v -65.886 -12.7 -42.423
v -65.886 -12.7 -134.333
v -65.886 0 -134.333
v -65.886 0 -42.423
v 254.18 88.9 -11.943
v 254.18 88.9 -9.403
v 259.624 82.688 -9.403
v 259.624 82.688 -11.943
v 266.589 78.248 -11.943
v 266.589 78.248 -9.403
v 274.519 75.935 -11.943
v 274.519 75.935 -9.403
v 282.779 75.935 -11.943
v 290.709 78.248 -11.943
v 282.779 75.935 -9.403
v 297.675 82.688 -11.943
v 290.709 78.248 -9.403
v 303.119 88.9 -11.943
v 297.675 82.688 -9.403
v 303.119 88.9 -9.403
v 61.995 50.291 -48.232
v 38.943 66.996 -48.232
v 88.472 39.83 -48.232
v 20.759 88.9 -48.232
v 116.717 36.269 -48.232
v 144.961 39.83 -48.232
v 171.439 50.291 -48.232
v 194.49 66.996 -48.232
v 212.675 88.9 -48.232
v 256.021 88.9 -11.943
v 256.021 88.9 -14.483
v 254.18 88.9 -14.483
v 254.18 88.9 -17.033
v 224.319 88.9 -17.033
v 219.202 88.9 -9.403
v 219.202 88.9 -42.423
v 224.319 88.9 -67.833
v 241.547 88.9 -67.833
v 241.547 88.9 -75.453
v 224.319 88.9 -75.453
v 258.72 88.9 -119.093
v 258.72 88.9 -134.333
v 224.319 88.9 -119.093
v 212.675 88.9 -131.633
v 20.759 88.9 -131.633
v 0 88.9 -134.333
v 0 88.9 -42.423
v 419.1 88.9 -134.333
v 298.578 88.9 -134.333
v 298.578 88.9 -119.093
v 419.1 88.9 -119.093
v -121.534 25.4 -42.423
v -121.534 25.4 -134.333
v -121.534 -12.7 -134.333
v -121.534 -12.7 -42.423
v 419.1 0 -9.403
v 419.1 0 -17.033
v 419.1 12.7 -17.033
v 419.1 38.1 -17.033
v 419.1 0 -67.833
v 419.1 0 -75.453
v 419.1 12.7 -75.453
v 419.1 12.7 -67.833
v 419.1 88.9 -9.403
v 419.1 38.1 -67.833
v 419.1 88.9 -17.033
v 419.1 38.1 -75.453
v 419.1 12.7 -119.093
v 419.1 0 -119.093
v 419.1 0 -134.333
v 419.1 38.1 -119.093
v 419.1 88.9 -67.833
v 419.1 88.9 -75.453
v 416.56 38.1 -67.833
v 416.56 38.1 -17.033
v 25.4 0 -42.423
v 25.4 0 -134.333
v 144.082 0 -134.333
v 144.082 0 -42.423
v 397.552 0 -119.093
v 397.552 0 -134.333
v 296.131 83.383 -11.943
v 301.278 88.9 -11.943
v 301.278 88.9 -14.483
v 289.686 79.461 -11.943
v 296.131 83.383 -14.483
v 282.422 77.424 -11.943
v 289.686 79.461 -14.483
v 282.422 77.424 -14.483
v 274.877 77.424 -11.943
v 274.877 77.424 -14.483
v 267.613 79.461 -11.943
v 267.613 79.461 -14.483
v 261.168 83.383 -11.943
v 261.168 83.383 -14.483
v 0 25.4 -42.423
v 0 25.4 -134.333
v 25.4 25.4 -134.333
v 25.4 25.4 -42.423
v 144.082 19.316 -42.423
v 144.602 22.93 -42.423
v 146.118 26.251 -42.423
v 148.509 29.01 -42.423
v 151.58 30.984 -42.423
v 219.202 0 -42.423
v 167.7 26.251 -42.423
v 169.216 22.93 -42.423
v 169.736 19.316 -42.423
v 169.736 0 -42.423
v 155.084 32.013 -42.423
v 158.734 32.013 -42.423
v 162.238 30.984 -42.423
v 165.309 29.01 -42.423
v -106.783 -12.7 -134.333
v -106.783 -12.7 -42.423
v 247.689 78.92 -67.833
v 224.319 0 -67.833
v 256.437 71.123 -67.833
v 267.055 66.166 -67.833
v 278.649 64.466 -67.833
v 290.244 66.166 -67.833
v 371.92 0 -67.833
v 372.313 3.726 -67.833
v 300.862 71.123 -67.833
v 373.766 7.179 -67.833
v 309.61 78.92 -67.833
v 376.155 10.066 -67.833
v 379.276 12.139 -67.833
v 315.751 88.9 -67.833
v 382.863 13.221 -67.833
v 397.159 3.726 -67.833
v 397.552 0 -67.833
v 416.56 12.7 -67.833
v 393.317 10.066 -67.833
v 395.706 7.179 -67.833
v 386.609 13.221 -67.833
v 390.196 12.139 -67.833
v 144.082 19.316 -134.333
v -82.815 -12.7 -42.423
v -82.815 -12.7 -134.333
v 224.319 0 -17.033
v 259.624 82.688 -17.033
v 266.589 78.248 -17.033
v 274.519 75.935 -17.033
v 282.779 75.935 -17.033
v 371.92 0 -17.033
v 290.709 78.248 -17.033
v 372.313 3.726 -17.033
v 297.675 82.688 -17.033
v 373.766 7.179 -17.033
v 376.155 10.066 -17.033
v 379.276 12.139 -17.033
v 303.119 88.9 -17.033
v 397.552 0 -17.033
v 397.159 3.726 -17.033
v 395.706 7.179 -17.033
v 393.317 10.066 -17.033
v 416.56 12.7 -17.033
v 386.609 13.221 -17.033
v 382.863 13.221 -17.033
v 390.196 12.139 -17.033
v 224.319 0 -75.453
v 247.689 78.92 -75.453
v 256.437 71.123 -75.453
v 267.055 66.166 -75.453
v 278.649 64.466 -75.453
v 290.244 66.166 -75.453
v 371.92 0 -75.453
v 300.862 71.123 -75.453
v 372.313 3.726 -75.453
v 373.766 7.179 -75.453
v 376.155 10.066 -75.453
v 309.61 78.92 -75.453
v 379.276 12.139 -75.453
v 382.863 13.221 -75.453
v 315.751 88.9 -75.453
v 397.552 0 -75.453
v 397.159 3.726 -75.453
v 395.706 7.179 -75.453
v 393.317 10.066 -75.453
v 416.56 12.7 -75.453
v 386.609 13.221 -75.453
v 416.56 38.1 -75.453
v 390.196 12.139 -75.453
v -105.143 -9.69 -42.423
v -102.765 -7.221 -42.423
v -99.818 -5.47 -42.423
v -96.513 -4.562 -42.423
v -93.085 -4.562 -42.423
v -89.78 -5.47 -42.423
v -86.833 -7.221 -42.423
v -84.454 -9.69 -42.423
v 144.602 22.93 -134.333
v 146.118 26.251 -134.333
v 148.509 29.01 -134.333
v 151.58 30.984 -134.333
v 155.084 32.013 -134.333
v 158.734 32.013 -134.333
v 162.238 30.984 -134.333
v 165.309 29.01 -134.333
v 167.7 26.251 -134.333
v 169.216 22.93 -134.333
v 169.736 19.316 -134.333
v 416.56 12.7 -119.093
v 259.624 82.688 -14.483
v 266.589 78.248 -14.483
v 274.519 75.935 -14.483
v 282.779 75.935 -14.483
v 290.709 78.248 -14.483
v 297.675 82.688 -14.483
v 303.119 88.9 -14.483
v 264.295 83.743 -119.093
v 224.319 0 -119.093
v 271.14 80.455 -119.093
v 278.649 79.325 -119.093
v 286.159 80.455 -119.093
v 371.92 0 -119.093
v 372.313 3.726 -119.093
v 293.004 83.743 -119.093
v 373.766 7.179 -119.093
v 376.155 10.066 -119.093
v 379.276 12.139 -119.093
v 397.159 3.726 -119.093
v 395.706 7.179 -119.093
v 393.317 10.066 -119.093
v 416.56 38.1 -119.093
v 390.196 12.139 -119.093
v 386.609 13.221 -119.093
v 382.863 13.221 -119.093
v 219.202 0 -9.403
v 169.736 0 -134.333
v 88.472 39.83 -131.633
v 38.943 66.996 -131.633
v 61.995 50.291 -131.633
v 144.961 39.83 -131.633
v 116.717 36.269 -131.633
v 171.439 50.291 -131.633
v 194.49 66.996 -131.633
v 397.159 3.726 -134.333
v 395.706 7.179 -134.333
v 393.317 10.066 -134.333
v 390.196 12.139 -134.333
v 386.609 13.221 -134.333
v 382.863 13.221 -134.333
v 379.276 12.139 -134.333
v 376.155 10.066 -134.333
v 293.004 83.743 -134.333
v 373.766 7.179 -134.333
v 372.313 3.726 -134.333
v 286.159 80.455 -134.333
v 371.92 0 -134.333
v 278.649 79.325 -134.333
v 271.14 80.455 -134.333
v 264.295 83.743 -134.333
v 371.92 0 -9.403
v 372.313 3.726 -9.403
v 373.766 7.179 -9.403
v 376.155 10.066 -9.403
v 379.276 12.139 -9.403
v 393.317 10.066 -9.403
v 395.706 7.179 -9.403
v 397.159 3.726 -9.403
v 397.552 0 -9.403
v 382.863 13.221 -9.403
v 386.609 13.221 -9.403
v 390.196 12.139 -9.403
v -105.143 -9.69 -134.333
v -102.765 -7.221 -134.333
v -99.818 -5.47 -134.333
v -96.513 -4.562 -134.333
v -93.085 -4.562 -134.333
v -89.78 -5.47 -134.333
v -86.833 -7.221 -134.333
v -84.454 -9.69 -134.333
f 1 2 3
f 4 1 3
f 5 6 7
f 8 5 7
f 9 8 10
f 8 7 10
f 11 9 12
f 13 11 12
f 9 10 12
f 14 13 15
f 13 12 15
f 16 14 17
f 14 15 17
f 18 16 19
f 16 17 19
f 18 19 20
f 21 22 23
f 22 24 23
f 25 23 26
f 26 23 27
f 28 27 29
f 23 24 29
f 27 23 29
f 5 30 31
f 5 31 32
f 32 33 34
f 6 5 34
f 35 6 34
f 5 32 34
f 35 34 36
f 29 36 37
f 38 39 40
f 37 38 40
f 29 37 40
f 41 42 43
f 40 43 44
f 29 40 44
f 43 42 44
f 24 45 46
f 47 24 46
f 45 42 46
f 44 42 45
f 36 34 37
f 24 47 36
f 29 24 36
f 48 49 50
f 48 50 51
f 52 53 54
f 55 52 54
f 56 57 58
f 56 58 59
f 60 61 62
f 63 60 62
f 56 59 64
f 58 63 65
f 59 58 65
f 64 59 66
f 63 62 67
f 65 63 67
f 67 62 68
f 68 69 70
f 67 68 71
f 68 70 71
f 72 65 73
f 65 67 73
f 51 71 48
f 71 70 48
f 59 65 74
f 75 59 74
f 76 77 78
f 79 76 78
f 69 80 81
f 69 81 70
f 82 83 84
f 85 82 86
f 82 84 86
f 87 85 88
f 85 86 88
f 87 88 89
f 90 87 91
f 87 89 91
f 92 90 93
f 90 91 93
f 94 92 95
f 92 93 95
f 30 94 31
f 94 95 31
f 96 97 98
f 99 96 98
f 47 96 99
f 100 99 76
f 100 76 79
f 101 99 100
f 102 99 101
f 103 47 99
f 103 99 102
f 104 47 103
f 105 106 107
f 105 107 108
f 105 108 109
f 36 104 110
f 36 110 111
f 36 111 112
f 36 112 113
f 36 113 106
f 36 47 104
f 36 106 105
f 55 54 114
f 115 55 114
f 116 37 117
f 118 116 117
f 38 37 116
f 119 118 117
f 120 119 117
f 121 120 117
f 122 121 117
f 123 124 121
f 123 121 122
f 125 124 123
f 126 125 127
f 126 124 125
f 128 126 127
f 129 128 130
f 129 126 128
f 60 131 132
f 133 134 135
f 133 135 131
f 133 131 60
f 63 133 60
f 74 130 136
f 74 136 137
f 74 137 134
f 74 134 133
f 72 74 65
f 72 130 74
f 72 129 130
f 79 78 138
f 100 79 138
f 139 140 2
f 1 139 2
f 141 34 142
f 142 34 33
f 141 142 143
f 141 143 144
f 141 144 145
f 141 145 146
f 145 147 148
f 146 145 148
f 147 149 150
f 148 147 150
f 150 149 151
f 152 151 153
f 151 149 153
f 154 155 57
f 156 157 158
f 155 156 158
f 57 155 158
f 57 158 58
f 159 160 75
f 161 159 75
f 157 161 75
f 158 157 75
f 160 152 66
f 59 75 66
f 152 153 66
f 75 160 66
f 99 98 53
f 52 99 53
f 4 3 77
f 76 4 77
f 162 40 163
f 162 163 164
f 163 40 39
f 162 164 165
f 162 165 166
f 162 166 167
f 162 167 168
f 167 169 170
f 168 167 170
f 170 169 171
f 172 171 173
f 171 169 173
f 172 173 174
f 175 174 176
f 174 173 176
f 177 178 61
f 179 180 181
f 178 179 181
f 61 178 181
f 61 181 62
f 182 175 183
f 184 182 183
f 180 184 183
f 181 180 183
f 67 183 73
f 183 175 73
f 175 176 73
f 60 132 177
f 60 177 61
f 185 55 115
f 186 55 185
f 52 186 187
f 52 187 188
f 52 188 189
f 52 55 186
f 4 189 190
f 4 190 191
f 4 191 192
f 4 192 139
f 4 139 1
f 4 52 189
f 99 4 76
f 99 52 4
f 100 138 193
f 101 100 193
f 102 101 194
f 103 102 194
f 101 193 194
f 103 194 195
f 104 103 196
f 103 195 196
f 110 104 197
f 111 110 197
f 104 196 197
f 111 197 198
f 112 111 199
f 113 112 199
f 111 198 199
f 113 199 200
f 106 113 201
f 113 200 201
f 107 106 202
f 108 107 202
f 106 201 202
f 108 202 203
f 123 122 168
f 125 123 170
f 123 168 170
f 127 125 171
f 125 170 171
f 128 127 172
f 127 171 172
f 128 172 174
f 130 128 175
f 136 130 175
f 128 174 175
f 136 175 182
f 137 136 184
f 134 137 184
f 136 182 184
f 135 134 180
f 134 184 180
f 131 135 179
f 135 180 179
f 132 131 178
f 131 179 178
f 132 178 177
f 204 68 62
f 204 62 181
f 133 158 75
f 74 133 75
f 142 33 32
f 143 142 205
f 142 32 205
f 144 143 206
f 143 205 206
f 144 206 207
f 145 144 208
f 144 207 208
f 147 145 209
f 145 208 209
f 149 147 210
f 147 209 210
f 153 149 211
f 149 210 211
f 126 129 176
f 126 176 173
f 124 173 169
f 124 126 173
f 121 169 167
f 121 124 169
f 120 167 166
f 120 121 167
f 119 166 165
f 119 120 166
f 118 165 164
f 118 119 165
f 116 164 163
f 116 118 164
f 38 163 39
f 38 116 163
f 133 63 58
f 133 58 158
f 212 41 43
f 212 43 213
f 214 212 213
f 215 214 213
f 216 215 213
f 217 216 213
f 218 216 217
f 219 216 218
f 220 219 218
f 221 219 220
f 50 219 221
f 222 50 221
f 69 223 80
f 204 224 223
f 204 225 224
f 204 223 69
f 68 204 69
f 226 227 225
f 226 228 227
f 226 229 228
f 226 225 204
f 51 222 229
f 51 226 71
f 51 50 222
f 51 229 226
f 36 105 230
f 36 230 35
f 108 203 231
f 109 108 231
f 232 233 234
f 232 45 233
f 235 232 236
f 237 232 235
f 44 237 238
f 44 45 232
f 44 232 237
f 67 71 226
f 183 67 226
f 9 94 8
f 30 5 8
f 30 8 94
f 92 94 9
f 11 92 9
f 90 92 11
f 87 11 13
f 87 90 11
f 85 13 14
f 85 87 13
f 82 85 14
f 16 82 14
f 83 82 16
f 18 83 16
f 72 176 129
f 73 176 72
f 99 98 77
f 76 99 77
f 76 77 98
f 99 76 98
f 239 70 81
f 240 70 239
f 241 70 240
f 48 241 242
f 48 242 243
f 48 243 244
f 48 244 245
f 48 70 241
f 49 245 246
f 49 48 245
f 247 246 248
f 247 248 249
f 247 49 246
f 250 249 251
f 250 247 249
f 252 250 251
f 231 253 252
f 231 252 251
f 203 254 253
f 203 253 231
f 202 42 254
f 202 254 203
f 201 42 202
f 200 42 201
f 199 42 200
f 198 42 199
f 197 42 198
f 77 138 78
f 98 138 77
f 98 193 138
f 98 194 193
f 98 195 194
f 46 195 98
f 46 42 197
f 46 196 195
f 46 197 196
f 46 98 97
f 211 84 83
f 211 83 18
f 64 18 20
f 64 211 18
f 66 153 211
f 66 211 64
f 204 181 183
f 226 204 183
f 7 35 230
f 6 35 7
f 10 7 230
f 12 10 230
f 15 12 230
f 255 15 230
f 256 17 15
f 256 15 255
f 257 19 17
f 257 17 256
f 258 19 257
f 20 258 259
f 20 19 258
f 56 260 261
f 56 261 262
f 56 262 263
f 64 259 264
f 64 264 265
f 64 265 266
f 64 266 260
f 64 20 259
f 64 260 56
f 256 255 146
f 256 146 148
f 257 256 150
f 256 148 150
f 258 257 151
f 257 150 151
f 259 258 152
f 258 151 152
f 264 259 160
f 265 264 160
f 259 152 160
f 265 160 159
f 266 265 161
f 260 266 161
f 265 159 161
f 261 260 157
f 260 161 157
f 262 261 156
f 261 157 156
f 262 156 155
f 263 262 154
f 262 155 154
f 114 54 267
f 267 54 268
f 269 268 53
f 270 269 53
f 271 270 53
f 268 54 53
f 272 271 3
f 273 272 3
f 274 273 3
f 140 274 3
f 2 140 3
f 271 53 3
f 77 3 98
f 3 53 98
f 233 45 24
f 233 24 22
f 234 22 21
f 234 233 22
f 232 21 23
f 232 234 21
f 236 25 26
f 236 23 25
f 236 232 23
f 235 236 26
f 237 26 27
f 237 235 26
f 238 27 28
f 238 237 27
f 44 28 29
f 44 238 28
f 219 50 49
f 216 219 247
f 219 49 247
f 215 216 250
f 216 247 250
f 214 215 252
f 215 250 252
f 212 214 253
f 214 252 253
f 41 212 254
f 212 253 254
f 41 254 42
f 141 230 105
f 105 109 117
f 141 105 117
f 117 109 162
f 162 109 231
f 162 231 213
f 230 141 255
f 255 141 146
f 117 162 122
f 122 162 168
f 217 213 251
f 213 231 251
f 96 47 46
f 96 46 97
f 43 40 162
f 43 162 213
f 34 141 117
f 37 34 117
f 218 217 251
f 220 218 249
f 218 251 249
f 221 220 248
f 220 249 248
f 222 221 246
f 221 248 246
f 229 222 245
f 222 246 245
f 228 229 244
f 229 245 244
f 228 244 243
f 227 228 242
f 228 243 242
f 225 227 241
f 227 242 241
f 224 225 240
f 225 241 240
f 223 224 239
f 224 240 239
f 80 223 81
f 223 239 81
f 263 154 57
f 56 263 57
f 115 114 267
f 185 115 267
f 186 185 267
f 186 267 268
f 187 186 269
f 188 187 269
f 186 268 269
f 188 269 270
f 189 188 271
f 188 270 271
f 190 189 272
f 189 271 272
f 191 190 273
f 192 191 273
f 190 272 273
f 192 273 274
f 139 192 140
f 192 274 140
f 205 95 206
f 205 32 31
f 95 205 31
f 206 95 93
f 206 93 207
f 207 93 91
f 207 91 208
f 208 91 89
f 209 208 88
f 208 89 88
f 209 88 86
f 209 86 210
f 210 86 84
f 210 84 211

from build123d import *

# Parameters (mm, degrees)
SKETCH1_W           = 419.1
SKETCH1_H           = 142.18412
BOSS_EXTRUDE1_DEPTH = 88.9
SKETCH2_R           = 119.38
CUT_EXTRUDE1_DEPTH  = 83.4009
SKETCH7_W           = 194.780719179
SKETCH7_H           = 43.63974
SKETCH7_H_2         = 50.8
CUT_EXTRUDE2_DEPTH  = 452.402640644
SKETCH4_R           = 40.386
CUT_EXTRUDE4_DEPTH  = 10
SKETCH18_R          = 25.527
CUT_EXTRUDE11_DEPTH = 23.09114
SKETCH5_R           = 27.686
CUT_EXTRUDE5_DEPTH  = 448.05209497
SKETCH8_W           = 419.1
SKETCH8_H           = 88.9
CUT_EXTRUDE6_DEPTH  = 7.85114
SKETCH9_W           = 419.1
SKETCH9_H           = 88.9
CUT_EXTRUDE7_DEPTH  = 11.94308
SKETCH10_W          = 219.202
SKETCH10_H          = 88.9
CUT_EXTRUDE8_DEPTH  = 30.48
SKETCH12_W          = 121.533574186
SKETCH12_H          = 91.9099
BOSS_EXTRUDE2_DEPTH = 25.4
SKETCH14_W          = 55.647095764
SKETCH14_H          = 91.9099
BOSS_EXTRUDE3_DEPTH = 12.7
CUT_EXTRUDE10_REACH = 447.564
SKETCH17_R          = 12.827
SKETCH20_W          = 2.54
SKETCH20_H          = 25.4
BOSS_EXTRUDE4_DEPTH = 102.05974
SPLIT2_START        = -134.33298
SPLIT2_DEPTH        = 91.9099
SPLIT2_START_2      = -48.23206
SPLIT2_2_DEPTH      = 5.80898
SPLIT2_3_DEPTH      = 2.70002
SPLIT2_4_DEPTH      = 91.9099
SPLIT2_START_3      = -121.533574186
SPLIT2_5_DEPTH      = 340.735574186
SKETCH22_W          = 199.898
SKETCH22_H          = 88.9
BOSS_EXTRUDE5_DEPTH = 2.54
SKETCH24_R          = 29.21
CUT_EXTRUDE12_DEPTH = 2.54
CUT_EXTRUDE13_START = -5.08
SKETCH24_4_R        = 29.21
CUT_EXTRUDE13_DEPTH = 2.55016
SKETCH29_R          = 12.827
CUT_EXTRUDE14_DEPTH = 446.564033133
BOSS_EXTRUDE7_DEPTH = 91.9099


# Read off the part's stored shape, not the designer's step: Split2
with BuildPart() as part:
    # Sketch1 → Boss-Extrude1 (new body)
    with BuildSketch(Plane(origin=(0, 0, 0), x_dir=(1, 0, 0), z_dir=(0, 1, 0))):
        with Locations((209.55, 71.09206)):
            Rectangle(SKETCH1_W, SKETCH1_H)
    extrude(amount=BOSS_EXTRUDE1_DEPTH)

    # Sketch2 → Cut-Extrude1 (cut)
    with BuildSketch(Plane(origin=(0, 0, -131.63296), x_dir=(-1, 0, 0), z_dir=(0, 0, -1))):
        with Locations((-116.7166499, 150.061217688)):
            Circle(SKETCH2_R)
    extrude(amount=-CUT_EXTRUDE1_DEPTH, mode=Mode.SUBTRACT)

    # Sketch7 → Cut-Extrude2 (cut, through all)
    with BuildSketch(Plane(origin=(0, 88.9, 0), x_dir=(1, 0, 0), z_dir=(0, 1, 0))):
        with Locations((321.709640411, 97.27311)):
            Rectangle(SKETCH7_W, SKETCH7_H)
        with Locations((321.709640411, 42.43324)):
            Rectangle(SKETCH7_W, SKETCH7_H_2)
    extrude(amount=-CUT_EXTRUDE2_DEPTH, mode=Mode.SUBTRACT)

    # Sketch4 → Cut-Extrude4 (cut)
    with BuildSketch(Plane(origin=(0, 0, -67.83324), x_dir=(-1, 0, 0), z_dir=(0, 0, -1))):
        with Locations((-278.649352085, 104.852009966)):
            Circle(SKETCH4_R)
    extrude(amount=CUT_EXTRUDE4_DEPTH, mode=Mode.SUBTRACT)

    # Sketch18 → Cut-Extrude11 (cut)
    with BuildSketch(Plane(origin=(0, 0, -142.18412), x_dir=(-1, 0, 0), z_dir=(0, 0, -1))):
        with Locations((-278.649352085, 104.852009966)):
            Circle(SKETCH18_R)
    extrude(amount=-CUT_EXTRUDE11_DEPTH, mode=Mode.SUBTRACT)

    # Sketch5 → Cut-Extrude5 (cut, through all)
    with BuildSketch(Plane(origin=(0, 0, -14.48308), x_dir=(-1, 0, 0), z_dir=(0, 0, -1))):
        with Locations((-278.649352085, 104.852009966)):
            Circle(SKETCH5_R)
    extrude(amount=-CUT_EXTRUDE5_DEPTH, mode=Mode.SUBTRACT)

    # Sketch8 → Cut-Extrude6 (cut)
    with BuildSketch(Plane(origin=(0, 0, -142.18412), x_dir=(-1, 0, 0), z_dir=(0, 0, -1))):
        with Locations((-209.55, 44.45)):
            Rectangle(SKETCH8_W, SKETCH8_H)
    extrude(amount=-CUT_EXTRUDE6_DEPTH, mode=Mode.SUBTRACT)

    # Sketch9 → Cut-Extrude7 (cut)
    with BuildSketch(Plane.XY):
        with Locations((209.55, 44.45)):
            Rectangle(SKETCH9_W, SKETCH9_H)
    extrude(amount=-CUT_EXTRUDE7_DEPTH, mode=Mode.SUBTRACT)

    # Sketch10 → Cut-Extrude8 (cut)
    with BuildSketch(Plane.XY.offset(-11.94308)):
        with Locations((109.601, 44.45)):
            Rectangle(SKETCH10_W, SKETCH10_H)
    extrude(amount=-CUT_EXTRUDE8_DEPTH, mode=Mode.SUBTRACT)

    # Sketch12 → Boss-Extrude2 (add)
    with BuildSketch(Plane.XZ):
        with Locations((-60.766787093, -88.37803)):
            Rectangle(SKETCH12_W, SKETCH12_H)
    extrude(amount=-BOSS_EXTRUDE2_DEPTH)

    # Sketch14 → Boss-Extrude3 (add)
    with BuildSketch(Plane.XZ):
        with Locations((-93.710026304, -88.37803)):
            Rectangle(SKETCH14_W, SKETCH14_H)
    extrude(amount=BOSS_EXTRUDE3_DEPTH)

    # Cut-Extrude10: up to this face of the body (flat: up to its plane)
    cut_extrude10_end = Plane(part.part.faces().sort_by_distance((320.017892525, 43.601141034, -11.94308))[0])
    # Sketch17 → Cut-Extrude10 (cut, up to the picked face)
    with BuildSketch(Plane(origin=(0, 0, -134.33298), x_dir=(-1, 0, 0), z_dir=(0, 0, -1)), mode=Mode.PRIVATE) as cut_extrude10_sk1:
        with Locations((-384.735935495, 0.531880938)):
            Circle(SKETCH17_R)
    cut_extrude10_tool1 = split(extrude(cut_extrude10_sk1.sketch, amount=-CUT_EXTRUDE10_REACH, mode=Mode.PRIVATE), bisect_by=cut_extrude10_end, keep=Keep.BOTH, mode=Mode.PRIVATE)
    # Sketch17 → Cut-Extrude10 (cut, up to the picked face)
    with BuildSketch(Plane(origin=(0, 0, -134.33298), x_dir=(-1, 0, 0), z_dir=(0, 0, -1)), mode=Mode.PRIVATE) as cut_extrude10_sk2:
        with Locations((94.798916194, -17.274045482)):
            Circle(SKETCH17_R)
    cut_extrude10_tool2 = split(extrude(cut_extrude10_sk2.sketch, amount=-CUT_EXTRUDE10_REACH, mode=Mode.PRIVATE), bisect_by=cut_extrude10_end, keep=Keep.BOTH, mode=Mode.PRIVATE)
    # Sketch17 → Cut-Extrude10 (cut, up to the picked face)
    with BuildSketch(Plane(origin=(0, 0, -134.33298), x_dir=(-1, 0, 0), z_dir=(0, 0, -1)), mode=Mode.PRIVATE) as cut_extrude10_sk3:
        with BuildLine():
            Line((-169.736021607, 19.31637742), (-169.736021607, 0))
            Line((-169.736021607, 0), (-144.082021607, 0))
            Line((-144.082021607, 0), (-144.082021607, 19.31637742))
            ThreePointArc((-144.082021607, 19.31637742), (-156.909021607, 32.14337742), (-169.736021607, 19.31637742))
        make_face()
    cut_extrude10_tool3 = split(extrude(cut_extrude10_sk3.sketch, amount=-CUT_EXTRUDE10_REACH, mode=Mode.PRIVATE), bisect_by=cut_extrude10_end, keep=Keep.BOTH, mode=Mode.PRIVATE)
    add(cut_extrude10_tool1.solids().sort_by(Axis((384.735935, 0.531881, -134.33298), (0, 0, 1)))[0], mode=Mode.SUBTRACT)
    add(cut_extrude10_tool2.solids().sort_by(Axis((-94.798916, -17.274045, -134.33298), (0, 0, 1)))[0], mode=Mode.SUBTRACT)
    add(cut_extrude10_tool3.solids().sort_by(Axis((156.909022, 14.834778, -134.33298), (0, 0, 1)))[0], mode=Mode.SUBTRACT)

    # Sketch20 → Boss-Extrude4 (add)
    with BuildSketch(Plane(origin=(0, 0, -17.03324), x_dir=(-1, 0, 0), z_dir=(0, 0, -1))):
        with Locations((-417.83, 25.4)):
            Rectangle(SKETCH20_W, SKETCH20_H)
    extrude(amount=BOSS_EXTRUDE4_DEPTH)

    # Split2 5 outline → Split2 5 (cut)
    with BuildSketch(Plane.YZ.offset(SPLIT2_START_3)):
        Polygon((-12.7, -42.42308), (-12.7, -134.33298), (88.9, -134.33298), (88.9, -131.63296), (88.9, -48.23206), (88.9, -42.42308), align=None)
    extrude(amount=SPLIT2_5_DEPTH, mode=Mode.SUBTRACT)

    # Sketch22 → Boss-Extrude5 (add)
    with BuildSketch(Plane.XY.offset(-11.94308)):
        with Locations((319.151, 44.45)):
            Rectangle(SKETCH22_W, SKETCH22_H)
    extrude(amount=BOSS_EXTRUDE5_DEPTH)

    # Sketch24 → Cut-Extrude12 (cut)
    with BuildSketch(Plane.XY.offset(-9.40308)):
        with Locations((278.649352085, 104.852009966)):
            Circle(SKETCH24_R)
    extrude(amount=-CUT_EXTRUDE12_DEPTH, mode=Mode.SUBTRACT)

    # Sketch24<4> → Cut-Extrude13 (cut)
    with BuildSketch(Plane.XY.offset(-9.40308).offset(CUT_EXTRUDE13_START)):
        with Locations((278.649352085, 104.852009966)):
            Circle(SKETCH24_4_R)
    extrude(amount=-CUT_EXTRUDE13_DEPTH, mode=Mode.SUBTRACT)

    # Sketch29 → Cut-Extrude14 (cut, through all)
    with BuildSketch(Plane(origin=(0, 0, -11.94308), x_dir=(-1, 0, 0), z_dir=(0, 0, -1))):
        with Locations((-384.735935495, 0.531880938)):
            Circle(SKETCH29_R)
    extrude(amount=-CUT_EXTRUDE14_DEPTH, mode=Mode.SUBTRACT)



with BuildPart() as body_2:
    # Split2 outline → Split2 (new body)
    with BuildSketch(Plane.XY.offset(SPLIT2_START)):
        with BuildLine():
            Line((219.202, 0), (219.202, 88.837550574))
            ThreePointArc((219.202, 88.837550574), (116.680284427, 30.681223227), (14.194018979, 88.9))
            Line((14.194018979, 88.9), (0, 88.9))
            Line((0, 88.9), (0, 25.4))
            Line((0, 25.4), (25.4, 25.4))
            Line((25.4, 25.4), (25.4, 0))
            Line((25.4, 0), (144.082021607, 0))
            Line((144.082021607, 0), (144.082021607, 19.31637742))
            ThreePointArc((144.082021607, 19.31637742), (156.909021607, 32.14337742), (169.736021607, 19.31637742))
            Line((169.736021607, 19.31637742), (169.736021607, 0))
            Line((169.736021607, 0), (219.202, 0))
        make_face()
    extrude(amount=SPLIT2_DEPTH)

    # Split2 2 outline → Split2 2 (add)
    with BuildSketch(Plane.XY.offset(SPLIT2_START_2)):
        with BuildLine():
            Line((219.202, 88.837550574), (219.202, 88.9))
            Line((219.202, 88.9), (14.194018979, 88.9))
            ThreePointArc((14.194018979, 88.9), (116.680284427, 30.681223227), (219.202, 88.837550574))
        make_face()
    extrude(amount=SPLIT2_2_DEPTH)

    # Split2 3 outline → Split2 3 (add)
    with BuildSketch(Plane.XY.offset(SPLIT2_START)):
        with BuildLine():
            Line((219.202, 88.837550574), (219.202, 88.9))
            Line((219.202, 88.9), (14.194018979, 88.9))
            ThreePointArc((14.194018979, 88.9), (116.680284427, 30.681223227), (219.202, 88.837550574))
        make_face()
    extrude(amount=SPLIT2_3_DEPTH)


with BuildPart() as body_3:
    # Split2 4 outline → Split2 4 (new body)
    with BuildSketch(Plane.XY.offset(SPLIT2_START)):
        with BuildLine():
            Line((25.4, 0), (25.4, 25.4))
            Line((25.4, 25.4), (-121.533574186, 25.4))
            Line((-121.533574186, 25.4), (-121.533574186, -12.7))
            Line((-121.533574186, -12.7), (-106.782656717, -12.7))
            ThreePointArc((-106.782656717, -12.7), (-94.798916194, -4.447045482), (-82.815175671, -12.7))
            Line((-82.815175671, -12.7), (-65.886478422, -12.7))
            Line((-65.886478422, -12.7), (-65.886478422, 0))
            Line((-65.886478422, 0), (25.4, 0))
        make_face()
    extrude(amount=SPLIT2_4_DEPTH)


with BuildPart() as part_1:
    add(part.part)

    add(body_2.part)  # Boss-Extrude7 merges body 2
    # Sketch30 → Boss-Extrude7 (add)
    with BuildSketch(Plane(origin=(0, 0, -134.33298), x_dir=(-1, 0, 0), z_dir=(0, 0, -1))):
        with BuildLine():
            Line((-14.194018979, 88.9), (-20.758717893, 88.9))
            ThreePointArc((-20.758717893, 88.9), (-116.7166499, 36.269217688), (-212.674581906, 88.9))
            Line((-212.674581906, 88.9), (-219.239280821, 88.9))
            ThreePointArc((-219.239280821, 88.9), (-116.7166499, 30.681217688), (-14.194018979, 88.9))
        make_face()
    extrude(amount=-BOSS_EXTRUDE7_DEPTH)


solid = Compound([body_3.part, part_1.part])
